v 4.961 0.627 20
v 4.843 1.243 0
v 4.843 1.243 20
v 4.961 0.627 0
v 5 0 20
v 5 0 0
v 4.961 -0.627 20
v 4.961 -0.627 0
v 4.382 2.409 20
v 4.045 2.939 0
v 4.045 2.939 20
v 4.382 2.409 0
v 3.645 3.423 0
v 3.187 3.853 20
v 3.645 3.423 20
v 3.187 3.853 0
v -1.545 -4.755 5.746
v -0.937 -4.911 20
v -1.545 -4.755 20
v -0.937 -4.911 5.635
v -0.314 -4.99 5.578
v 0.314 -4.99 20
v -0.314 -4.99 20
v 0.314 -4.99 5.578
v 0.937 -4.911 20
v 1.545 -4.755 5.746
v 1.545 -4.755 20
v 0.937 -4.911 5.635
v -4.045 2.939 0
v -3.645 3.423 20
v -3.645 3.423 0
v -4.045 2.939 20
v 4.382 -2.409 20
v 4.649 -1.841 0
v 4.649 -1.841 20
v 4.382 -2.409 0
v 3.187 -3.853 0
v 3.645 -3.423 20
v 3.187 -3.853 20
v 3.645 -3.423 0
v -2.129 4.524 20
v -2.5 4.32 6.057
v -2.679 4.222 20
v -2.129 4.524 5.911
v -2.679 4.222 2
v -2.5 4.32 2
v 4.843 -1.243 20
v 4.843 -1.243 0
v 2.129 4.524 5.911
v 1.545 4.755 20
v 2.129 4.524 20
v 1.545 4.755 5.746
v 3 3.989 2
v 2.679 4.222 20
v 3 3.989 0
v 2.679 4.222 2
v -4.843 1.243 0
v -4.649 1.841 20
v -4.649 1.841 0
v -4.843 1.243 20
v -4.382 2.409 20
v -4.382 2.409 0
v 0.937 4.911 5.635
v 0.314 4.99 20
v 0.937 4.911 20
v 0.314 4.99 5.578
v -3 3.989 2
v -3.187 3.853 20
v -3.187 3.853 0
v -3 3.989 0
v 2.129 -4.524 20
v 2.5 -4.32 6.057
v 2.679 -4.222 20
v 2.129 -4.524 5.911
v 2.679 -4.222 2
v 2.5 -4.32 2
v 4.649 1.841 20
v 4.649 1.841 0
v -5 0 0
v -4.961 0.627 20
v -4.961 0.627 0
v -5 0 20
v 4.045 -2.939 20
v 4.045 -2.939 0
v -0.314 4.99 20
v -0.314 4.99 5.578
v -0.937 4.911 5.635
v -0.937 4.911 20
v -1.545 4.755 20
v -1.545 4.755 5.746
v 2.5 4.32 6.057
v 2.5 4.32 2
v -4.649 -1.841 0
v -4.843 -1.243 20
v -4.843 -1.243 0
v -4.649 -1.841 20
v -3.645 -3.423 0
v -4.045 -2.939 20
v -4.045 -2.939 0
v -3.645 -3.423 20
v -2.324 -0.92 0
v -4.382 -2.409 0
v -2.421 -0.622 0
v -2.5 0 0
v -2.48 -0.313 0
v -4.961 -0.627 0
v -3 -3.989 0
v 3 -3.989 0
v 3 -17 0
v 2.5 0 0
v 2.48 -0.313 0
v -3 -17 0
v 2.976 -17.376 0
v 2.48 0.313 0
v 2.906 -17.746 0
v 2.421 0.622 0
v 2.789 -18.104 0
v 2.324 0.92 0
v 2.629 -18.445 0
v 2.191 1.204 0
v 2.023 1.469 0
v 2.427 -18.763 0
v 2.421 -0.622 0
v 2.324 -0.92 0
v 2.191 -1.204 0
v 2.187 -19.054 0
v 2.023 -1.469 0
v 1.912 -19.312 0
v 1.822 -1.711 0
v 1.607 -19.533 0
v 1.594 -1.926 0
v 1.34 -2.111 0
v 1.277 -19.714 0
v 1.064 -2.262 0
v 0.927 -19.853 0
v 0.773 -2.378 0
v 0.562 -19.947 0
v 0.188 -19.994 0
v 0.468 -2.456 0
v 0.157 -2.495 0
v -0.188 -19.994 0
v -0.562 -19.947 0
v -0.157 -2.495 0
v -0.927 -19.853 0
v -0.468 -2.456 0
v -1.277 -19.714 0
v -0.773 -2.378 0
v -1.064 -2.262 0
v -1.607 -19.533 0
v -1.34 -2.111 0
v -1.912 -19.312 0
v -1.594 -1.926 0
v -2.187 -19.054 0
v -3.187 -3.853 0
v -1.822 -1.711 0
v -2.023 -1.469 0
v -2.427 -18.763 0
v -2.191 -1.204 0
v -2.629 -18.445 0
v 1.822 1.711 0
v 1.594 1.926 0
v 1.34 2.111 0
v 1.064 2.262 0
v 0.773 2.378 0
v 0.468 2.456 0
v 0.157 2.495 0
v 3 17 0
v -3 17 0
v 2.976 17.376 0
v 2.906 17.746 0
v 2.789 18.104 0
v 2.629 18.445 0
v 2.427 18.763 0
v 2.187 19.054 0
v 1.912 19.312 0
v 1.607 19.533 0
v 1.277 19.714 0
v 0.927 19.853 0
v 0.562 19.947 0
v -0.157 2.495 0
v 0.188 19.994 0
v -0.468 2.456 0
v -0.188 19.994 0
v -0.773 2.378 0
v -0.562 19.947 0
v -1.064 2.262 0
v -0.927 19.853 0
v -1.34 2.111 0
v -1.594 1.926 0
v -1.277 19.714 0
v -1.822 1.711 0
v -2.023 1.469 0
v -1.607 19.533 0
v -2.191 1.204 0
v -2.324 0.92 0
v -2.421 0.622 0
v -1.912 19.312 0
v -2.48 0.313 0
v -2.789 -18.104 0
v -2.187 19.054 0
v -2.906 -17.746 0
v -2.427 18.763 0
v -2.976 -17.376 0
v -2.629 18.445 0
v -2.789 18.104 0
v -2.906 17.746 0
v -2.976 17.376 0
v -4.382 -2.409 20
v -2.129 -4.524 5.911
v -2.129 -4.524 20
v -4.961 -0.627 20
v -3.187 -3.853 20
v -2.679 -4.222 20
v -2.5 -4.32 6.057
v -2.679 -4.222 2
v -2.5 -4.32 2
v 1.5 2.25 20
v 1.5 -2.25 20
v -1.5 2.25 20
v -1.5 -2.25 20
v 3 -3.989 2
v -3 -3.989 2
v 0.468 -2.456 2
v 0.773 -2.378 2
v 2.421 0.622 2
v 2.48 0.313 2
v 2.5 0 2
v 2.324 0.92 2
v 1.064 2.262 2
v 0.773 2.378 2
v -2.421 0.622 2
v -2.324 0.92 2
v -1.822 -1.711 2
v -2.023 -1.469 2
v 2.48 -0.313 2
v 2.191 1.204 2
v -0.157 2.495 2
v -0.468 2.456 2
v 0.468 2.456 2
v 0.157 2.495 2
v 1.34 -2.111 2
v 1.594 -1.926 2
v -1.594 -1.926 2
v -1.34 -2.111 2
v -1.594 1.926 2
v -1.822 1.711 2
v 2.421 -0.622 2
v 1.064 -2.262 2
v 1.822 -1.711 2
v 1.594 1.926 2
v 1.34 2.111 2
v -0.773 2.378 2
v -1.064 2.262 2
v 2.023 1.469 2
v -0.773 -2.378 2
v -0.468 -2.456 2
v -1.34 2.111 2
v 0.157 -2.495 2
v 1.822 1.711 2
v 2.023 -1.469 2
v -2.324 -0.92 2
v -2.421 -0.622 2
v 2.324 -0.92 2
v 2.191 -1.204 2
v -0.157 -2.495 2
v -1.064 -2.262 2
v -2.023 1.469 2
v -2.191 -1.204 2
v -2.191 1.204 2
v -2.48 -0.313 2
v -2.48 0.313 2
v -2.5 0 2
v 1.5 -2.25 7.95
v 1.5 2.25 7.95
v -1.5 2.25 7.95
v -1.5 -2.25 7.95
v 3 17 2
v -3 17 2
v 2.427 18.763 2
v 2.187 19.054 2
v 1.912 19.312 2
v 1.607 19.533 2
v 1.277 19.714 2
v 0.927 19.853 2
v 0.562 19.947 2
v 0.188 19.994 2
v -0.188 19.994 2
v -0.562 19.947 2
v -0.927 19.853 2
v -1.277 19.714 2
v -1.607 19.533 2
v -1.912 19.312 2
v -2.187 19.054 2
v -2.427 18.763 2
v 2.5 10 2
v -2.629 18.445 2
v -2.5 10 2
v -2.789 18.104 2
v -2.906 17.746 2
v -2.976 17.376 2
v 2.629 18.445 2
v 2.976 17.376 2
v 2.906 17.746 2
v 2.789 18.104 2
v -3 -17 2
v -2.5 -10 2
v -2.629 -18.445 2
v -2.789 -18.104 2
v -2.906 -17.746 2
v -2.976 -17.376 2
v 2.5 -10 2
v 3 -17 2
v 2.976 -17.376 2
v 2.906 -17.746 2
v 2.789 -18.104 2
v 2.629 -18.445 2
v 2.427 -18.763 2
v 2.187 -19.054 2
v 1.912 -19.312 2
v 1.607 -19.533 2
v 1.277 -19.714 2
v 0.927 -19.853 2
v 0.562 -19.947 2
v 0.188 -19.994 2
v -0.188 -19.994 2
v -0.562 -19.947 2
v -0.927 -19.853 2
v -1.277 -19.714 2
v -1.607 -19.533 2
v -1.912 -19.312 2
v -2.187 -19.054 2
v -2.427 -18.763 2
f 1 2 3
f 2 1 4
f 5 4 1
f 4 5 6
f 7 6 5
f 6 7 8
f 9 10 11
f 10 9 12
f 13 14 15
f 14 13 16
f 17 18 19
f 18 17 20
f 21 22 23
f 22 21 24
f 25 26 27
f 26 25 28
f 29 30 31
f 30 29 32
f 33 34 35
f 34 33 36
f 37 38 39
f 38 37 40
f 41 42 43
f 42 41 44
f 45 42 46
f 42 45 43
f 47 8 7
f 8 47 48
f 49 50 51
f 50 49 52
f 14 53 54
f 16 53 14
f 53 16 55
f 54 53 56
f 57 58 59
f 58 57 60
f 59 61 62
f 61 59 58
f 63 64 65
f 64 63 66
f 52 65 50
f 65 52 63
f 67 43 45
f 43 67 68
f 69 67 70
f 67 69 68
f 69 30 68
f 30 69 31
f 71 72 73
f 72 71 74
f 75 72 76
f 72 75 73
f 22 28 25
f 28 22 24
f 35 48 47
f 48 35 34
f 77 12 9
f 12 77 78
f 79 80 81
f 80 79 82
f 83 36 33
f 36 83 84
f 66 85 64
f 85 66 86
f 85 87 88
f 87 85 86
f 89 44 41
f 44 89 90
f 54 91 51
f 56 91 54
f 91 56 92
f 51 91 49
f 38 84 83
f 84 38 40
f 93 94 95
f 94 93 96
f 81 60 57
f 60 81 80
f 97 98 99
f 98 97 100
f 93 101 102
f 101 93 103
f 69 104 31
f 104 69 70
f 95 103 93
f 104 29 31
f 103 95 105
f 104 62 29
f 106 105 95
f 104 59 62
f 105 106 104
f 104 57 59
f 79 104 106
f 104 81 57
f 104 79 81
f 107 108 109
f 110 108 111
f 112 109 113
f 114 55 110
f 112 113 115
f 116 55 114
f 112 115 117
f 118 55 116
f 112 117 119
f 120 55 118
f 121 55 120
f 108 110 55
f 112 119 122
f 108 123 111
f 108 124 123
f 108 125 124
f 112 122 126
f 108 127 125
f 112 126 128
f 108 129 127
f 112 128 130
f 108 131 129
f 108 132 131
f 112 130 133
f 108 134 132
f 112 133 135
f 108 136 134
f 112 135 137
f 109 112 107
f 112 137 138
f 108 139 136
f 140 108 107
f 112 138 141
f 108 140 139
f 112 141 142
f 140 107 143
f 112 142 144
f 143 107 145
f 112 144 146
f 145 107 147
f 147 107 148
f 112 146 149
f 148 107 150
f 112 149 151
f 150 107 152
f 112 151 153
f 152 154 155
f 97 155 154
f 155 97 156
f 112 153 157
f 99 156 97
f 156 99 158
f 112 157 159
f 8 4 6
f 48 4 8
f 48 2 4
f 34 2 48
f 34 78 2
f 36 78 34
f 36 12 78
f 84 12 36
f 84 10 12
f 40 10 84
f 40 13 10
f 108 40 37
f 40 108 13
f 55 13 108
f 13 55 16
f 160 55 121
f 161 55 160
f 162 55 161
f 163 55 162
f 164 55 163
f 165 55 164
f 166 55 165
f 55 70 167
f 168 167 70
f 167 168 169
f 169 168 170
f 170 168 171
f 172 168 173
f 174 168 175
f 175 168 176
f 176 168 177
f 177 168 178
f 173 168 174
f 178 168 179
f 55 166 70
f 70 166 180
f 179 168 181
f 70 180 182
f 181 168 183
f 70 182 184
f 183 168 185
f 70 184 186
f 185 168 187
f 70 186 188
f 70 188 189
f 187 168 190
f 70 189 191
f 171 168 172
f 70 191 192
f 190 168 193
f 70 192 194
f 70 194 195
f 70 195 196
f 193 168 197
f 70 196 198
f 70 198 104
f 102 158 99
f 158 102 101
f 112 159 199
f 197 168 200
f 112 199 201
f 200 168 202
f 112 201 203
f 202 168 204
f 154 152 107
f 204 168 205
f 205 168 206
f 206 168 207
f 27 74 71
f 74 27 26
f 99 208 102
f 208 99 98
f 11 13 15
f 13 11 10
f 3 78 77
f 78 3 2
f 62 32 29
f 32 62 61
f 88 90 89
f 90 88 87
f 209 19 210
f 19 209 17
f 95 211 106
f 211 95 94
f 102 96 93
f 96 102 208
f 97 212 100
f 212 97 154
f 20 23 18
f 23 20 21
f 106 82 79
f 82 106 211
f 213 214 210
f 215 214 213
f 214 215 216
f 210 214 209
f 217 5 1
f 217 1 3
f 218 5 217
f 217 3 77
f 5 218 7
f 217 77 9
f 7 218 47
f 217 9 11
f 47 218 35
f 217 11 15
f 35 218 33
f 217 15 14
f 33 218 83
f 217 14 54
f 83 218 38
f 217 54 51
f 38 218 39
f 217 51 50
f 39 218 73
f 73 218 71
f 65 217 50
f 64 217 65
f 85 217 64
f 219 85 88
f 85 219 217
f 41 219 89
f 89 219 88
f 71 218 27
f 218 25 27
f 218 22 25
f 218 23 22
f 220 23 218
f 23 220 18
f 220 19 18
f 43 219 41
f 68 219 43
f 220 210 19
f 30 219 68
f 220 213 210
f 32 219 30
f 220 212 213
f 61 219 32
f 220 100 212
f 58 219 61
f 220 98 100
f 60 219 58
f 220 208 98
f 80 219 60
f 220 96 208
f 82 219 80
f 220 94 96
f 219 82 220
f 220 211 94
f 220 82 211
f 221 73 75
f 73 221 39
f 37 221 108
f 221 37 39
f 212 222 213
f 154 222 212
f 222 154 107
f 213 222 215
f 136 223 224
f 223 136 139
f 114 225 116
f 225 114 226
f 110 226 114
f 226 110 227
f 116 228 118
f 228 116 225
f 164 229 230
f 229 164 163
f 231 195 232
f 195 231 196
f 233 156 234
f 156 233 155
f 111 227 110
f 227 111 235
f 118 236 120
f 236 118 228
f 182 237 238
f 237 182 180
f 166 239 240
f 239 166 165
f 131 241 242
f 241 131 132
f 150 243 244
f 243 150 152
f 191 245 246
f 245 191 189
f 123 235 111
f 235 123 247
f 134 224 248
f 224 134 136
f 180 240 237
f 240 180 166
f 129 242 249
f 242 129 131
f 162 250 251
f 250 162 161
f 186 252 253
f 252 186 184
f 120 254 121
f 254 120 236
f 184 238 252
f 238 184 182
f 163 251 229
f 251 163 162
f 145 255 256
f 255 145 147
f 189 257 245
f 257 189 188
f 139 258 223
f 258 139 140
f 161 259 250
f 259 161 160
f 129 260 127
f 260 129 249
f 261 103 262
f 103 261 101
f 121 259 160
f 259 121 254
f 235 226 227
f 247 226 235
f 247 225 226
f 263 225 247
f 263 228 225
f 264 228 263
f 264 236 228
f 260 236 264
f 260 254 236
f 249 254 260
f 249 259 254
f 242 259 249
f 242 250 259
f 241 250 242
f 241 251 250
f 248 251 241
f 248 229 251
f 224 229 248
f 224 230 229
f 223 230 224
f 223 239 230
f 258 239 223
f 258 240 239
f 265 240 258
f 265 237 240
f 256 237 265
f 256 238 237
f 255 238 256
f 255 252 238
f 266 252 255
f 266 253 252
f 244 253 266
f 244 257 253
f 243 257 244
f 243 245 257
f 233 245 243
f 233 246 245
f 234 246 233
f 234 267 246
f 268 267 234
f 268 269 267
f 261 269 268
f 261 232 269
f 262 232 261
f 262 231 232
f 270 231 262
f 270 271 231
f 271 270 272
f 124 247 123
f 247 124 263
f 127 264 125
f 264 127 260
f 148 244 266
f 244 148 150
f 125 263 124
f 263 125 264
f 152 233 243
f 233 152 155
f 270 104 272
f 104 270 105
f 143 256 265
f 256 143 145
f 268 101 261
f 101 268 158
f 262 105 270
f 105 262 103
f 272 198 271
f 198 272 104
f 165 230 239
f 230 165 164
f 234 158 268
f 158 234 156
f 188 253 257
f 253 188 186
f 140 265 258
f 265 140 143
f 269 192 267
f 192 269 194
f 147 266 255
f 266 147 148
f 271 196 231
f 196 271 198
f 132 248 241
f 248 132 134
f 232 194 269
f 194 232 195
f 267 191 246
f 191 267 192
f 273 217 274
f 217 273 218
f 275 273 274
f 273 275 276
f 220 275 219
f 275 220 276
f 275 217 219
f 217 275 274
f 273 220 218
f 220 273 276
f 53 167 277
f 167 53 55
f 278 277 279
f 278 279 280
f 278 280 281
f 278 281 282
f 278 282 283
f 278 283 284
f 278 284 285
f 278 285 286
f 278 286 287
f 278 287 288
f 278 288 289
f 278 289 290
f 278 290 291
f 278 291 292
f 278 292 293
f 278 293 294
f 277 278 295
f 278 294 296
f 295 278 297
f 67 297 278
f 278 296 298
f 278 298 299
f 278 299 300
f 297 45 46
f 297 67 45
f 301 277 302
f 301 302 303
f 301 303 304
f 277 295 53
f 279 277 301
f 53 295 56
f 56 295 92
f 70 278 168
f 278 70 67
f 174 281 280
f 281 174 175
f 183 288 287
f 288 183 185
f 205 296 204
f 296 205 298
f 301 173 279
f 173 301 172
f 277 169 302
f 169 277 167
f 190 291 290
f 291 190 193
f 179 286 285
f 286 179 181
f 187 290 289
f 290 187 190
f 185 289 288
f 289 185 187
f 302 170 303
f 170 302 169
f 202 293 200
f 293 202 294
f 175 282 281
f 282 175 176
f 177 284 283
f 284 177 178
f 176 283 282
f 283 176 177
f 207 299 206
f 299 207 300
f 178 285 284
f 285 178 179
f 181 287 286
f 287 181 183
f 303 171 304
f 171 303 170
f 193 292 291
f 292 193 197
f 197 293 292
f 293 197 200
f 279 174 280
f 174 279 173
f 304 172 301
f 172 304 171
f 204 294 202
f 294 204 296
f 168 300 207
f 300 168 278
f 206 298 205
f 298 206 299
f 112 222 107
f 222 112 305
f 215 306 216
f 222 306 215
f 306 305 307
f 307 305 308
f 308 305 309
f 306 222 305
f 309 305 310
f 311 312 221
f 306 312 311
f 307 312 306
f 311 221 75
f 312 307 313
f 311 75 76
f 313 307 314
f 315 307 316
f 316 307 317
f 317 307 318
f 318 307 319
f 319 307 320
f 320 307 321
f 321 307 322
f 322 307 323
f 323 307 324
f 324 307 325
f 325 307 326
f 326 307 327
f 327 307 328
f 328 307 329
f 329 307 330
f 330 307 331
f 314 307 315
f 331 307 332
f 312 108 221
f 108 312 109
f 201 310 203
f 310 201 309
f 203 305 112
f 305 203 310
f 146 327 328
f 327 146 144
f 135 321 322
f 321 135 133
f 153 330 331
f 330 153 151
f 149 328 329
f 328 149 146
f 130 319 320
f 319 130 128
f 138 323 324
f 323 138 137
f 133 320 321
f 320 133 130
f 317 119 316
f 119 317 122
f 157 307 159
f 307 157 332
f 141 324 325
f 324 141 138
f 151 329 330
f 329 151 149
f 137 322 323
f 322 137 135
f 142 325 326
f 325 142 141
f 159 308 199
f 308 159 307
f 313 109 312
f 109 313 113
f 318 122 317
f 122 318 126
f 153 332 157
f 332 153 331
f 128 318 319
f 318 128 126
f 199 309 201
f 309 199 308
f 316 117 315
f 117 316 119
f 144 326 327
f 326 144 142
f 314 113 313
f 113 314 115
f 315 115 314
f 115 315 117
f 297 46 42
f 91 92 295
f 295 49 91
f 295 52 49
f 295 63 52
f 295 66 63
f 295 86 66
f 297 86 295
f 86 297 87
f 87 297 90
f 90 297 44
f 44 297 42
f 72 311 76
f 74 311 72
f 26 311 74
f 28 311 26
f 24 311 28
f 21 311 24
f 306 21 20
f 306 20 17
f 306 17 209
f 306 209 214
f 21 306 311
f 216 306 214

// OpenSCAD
$fn=50;
e=0.1;

// Horn dimensions (distance from center)
x_r=8;
y_r=14;

// parameters
cyl_r=5;
cyl_h=20;

cyl_open_cent_r=2.5;
cyl_open_cent_h=2;

blind_shaft_w=3;
blind_shaft_d=4.5;
blind_shaft_h=12;

mount_w=x_r-2;
mount_d=y_r;
mount_h=2;

support_h=5;
support_d=7;
support_w=mount_w-1;

////////////////////////////////////////////

main_body();
mount_tab(cyl_r-2);
rotate([0,0,180])
    mount_tab(cyl_r-2);

translate([-support_w/2,cyl_r-2,mount_h])
    support(support_w, support_d, support_h);

rotate([0,0,180])
    translate([-support_w/2,cyl_r-2,mount_h])
        support(support_w, support_d, support_h);

////////////////////////////////////////////

/**
*   Support for mounting tab
*/
module support(sup_w, sup_d, sup_h) {

    rotate(a=[90,0,90])
    linear_extrude(height=sup_w)
    polygon(points=[[0,0],[0,sup_h],[sup_d,0]]);

}

/**
*   Tab for mounting to servo horn
*       offset : offset from center
*/
module mount_tab(offset) {

    translate([0,mount_d/2+offset,mount_h/2])
        cube([mount_w, mount_d, mount_h], center=true);

    translate([0,mount_d+offset,mount_h/2])
        cylinder(mount_h, r=mount_w/2, center=true);

}

module main_body() {

    difference() {

        translate([0,0,cyl_h/2])
            cylinder(cyl_h, r=cyl_r, center=true);

        translate([0,0,cyl_open_cent_h/2])
            cylinder(cyl_open_cent_h, r=cyl_open_cent_r, center=true);
        
        translate([0,0,cyl_h-blind_shaft_h+blind_shaft_h/2])
            cube([blind_shaft_w, blind_shaft_d, blind_shaft_h+e], center=true);
    }

}
